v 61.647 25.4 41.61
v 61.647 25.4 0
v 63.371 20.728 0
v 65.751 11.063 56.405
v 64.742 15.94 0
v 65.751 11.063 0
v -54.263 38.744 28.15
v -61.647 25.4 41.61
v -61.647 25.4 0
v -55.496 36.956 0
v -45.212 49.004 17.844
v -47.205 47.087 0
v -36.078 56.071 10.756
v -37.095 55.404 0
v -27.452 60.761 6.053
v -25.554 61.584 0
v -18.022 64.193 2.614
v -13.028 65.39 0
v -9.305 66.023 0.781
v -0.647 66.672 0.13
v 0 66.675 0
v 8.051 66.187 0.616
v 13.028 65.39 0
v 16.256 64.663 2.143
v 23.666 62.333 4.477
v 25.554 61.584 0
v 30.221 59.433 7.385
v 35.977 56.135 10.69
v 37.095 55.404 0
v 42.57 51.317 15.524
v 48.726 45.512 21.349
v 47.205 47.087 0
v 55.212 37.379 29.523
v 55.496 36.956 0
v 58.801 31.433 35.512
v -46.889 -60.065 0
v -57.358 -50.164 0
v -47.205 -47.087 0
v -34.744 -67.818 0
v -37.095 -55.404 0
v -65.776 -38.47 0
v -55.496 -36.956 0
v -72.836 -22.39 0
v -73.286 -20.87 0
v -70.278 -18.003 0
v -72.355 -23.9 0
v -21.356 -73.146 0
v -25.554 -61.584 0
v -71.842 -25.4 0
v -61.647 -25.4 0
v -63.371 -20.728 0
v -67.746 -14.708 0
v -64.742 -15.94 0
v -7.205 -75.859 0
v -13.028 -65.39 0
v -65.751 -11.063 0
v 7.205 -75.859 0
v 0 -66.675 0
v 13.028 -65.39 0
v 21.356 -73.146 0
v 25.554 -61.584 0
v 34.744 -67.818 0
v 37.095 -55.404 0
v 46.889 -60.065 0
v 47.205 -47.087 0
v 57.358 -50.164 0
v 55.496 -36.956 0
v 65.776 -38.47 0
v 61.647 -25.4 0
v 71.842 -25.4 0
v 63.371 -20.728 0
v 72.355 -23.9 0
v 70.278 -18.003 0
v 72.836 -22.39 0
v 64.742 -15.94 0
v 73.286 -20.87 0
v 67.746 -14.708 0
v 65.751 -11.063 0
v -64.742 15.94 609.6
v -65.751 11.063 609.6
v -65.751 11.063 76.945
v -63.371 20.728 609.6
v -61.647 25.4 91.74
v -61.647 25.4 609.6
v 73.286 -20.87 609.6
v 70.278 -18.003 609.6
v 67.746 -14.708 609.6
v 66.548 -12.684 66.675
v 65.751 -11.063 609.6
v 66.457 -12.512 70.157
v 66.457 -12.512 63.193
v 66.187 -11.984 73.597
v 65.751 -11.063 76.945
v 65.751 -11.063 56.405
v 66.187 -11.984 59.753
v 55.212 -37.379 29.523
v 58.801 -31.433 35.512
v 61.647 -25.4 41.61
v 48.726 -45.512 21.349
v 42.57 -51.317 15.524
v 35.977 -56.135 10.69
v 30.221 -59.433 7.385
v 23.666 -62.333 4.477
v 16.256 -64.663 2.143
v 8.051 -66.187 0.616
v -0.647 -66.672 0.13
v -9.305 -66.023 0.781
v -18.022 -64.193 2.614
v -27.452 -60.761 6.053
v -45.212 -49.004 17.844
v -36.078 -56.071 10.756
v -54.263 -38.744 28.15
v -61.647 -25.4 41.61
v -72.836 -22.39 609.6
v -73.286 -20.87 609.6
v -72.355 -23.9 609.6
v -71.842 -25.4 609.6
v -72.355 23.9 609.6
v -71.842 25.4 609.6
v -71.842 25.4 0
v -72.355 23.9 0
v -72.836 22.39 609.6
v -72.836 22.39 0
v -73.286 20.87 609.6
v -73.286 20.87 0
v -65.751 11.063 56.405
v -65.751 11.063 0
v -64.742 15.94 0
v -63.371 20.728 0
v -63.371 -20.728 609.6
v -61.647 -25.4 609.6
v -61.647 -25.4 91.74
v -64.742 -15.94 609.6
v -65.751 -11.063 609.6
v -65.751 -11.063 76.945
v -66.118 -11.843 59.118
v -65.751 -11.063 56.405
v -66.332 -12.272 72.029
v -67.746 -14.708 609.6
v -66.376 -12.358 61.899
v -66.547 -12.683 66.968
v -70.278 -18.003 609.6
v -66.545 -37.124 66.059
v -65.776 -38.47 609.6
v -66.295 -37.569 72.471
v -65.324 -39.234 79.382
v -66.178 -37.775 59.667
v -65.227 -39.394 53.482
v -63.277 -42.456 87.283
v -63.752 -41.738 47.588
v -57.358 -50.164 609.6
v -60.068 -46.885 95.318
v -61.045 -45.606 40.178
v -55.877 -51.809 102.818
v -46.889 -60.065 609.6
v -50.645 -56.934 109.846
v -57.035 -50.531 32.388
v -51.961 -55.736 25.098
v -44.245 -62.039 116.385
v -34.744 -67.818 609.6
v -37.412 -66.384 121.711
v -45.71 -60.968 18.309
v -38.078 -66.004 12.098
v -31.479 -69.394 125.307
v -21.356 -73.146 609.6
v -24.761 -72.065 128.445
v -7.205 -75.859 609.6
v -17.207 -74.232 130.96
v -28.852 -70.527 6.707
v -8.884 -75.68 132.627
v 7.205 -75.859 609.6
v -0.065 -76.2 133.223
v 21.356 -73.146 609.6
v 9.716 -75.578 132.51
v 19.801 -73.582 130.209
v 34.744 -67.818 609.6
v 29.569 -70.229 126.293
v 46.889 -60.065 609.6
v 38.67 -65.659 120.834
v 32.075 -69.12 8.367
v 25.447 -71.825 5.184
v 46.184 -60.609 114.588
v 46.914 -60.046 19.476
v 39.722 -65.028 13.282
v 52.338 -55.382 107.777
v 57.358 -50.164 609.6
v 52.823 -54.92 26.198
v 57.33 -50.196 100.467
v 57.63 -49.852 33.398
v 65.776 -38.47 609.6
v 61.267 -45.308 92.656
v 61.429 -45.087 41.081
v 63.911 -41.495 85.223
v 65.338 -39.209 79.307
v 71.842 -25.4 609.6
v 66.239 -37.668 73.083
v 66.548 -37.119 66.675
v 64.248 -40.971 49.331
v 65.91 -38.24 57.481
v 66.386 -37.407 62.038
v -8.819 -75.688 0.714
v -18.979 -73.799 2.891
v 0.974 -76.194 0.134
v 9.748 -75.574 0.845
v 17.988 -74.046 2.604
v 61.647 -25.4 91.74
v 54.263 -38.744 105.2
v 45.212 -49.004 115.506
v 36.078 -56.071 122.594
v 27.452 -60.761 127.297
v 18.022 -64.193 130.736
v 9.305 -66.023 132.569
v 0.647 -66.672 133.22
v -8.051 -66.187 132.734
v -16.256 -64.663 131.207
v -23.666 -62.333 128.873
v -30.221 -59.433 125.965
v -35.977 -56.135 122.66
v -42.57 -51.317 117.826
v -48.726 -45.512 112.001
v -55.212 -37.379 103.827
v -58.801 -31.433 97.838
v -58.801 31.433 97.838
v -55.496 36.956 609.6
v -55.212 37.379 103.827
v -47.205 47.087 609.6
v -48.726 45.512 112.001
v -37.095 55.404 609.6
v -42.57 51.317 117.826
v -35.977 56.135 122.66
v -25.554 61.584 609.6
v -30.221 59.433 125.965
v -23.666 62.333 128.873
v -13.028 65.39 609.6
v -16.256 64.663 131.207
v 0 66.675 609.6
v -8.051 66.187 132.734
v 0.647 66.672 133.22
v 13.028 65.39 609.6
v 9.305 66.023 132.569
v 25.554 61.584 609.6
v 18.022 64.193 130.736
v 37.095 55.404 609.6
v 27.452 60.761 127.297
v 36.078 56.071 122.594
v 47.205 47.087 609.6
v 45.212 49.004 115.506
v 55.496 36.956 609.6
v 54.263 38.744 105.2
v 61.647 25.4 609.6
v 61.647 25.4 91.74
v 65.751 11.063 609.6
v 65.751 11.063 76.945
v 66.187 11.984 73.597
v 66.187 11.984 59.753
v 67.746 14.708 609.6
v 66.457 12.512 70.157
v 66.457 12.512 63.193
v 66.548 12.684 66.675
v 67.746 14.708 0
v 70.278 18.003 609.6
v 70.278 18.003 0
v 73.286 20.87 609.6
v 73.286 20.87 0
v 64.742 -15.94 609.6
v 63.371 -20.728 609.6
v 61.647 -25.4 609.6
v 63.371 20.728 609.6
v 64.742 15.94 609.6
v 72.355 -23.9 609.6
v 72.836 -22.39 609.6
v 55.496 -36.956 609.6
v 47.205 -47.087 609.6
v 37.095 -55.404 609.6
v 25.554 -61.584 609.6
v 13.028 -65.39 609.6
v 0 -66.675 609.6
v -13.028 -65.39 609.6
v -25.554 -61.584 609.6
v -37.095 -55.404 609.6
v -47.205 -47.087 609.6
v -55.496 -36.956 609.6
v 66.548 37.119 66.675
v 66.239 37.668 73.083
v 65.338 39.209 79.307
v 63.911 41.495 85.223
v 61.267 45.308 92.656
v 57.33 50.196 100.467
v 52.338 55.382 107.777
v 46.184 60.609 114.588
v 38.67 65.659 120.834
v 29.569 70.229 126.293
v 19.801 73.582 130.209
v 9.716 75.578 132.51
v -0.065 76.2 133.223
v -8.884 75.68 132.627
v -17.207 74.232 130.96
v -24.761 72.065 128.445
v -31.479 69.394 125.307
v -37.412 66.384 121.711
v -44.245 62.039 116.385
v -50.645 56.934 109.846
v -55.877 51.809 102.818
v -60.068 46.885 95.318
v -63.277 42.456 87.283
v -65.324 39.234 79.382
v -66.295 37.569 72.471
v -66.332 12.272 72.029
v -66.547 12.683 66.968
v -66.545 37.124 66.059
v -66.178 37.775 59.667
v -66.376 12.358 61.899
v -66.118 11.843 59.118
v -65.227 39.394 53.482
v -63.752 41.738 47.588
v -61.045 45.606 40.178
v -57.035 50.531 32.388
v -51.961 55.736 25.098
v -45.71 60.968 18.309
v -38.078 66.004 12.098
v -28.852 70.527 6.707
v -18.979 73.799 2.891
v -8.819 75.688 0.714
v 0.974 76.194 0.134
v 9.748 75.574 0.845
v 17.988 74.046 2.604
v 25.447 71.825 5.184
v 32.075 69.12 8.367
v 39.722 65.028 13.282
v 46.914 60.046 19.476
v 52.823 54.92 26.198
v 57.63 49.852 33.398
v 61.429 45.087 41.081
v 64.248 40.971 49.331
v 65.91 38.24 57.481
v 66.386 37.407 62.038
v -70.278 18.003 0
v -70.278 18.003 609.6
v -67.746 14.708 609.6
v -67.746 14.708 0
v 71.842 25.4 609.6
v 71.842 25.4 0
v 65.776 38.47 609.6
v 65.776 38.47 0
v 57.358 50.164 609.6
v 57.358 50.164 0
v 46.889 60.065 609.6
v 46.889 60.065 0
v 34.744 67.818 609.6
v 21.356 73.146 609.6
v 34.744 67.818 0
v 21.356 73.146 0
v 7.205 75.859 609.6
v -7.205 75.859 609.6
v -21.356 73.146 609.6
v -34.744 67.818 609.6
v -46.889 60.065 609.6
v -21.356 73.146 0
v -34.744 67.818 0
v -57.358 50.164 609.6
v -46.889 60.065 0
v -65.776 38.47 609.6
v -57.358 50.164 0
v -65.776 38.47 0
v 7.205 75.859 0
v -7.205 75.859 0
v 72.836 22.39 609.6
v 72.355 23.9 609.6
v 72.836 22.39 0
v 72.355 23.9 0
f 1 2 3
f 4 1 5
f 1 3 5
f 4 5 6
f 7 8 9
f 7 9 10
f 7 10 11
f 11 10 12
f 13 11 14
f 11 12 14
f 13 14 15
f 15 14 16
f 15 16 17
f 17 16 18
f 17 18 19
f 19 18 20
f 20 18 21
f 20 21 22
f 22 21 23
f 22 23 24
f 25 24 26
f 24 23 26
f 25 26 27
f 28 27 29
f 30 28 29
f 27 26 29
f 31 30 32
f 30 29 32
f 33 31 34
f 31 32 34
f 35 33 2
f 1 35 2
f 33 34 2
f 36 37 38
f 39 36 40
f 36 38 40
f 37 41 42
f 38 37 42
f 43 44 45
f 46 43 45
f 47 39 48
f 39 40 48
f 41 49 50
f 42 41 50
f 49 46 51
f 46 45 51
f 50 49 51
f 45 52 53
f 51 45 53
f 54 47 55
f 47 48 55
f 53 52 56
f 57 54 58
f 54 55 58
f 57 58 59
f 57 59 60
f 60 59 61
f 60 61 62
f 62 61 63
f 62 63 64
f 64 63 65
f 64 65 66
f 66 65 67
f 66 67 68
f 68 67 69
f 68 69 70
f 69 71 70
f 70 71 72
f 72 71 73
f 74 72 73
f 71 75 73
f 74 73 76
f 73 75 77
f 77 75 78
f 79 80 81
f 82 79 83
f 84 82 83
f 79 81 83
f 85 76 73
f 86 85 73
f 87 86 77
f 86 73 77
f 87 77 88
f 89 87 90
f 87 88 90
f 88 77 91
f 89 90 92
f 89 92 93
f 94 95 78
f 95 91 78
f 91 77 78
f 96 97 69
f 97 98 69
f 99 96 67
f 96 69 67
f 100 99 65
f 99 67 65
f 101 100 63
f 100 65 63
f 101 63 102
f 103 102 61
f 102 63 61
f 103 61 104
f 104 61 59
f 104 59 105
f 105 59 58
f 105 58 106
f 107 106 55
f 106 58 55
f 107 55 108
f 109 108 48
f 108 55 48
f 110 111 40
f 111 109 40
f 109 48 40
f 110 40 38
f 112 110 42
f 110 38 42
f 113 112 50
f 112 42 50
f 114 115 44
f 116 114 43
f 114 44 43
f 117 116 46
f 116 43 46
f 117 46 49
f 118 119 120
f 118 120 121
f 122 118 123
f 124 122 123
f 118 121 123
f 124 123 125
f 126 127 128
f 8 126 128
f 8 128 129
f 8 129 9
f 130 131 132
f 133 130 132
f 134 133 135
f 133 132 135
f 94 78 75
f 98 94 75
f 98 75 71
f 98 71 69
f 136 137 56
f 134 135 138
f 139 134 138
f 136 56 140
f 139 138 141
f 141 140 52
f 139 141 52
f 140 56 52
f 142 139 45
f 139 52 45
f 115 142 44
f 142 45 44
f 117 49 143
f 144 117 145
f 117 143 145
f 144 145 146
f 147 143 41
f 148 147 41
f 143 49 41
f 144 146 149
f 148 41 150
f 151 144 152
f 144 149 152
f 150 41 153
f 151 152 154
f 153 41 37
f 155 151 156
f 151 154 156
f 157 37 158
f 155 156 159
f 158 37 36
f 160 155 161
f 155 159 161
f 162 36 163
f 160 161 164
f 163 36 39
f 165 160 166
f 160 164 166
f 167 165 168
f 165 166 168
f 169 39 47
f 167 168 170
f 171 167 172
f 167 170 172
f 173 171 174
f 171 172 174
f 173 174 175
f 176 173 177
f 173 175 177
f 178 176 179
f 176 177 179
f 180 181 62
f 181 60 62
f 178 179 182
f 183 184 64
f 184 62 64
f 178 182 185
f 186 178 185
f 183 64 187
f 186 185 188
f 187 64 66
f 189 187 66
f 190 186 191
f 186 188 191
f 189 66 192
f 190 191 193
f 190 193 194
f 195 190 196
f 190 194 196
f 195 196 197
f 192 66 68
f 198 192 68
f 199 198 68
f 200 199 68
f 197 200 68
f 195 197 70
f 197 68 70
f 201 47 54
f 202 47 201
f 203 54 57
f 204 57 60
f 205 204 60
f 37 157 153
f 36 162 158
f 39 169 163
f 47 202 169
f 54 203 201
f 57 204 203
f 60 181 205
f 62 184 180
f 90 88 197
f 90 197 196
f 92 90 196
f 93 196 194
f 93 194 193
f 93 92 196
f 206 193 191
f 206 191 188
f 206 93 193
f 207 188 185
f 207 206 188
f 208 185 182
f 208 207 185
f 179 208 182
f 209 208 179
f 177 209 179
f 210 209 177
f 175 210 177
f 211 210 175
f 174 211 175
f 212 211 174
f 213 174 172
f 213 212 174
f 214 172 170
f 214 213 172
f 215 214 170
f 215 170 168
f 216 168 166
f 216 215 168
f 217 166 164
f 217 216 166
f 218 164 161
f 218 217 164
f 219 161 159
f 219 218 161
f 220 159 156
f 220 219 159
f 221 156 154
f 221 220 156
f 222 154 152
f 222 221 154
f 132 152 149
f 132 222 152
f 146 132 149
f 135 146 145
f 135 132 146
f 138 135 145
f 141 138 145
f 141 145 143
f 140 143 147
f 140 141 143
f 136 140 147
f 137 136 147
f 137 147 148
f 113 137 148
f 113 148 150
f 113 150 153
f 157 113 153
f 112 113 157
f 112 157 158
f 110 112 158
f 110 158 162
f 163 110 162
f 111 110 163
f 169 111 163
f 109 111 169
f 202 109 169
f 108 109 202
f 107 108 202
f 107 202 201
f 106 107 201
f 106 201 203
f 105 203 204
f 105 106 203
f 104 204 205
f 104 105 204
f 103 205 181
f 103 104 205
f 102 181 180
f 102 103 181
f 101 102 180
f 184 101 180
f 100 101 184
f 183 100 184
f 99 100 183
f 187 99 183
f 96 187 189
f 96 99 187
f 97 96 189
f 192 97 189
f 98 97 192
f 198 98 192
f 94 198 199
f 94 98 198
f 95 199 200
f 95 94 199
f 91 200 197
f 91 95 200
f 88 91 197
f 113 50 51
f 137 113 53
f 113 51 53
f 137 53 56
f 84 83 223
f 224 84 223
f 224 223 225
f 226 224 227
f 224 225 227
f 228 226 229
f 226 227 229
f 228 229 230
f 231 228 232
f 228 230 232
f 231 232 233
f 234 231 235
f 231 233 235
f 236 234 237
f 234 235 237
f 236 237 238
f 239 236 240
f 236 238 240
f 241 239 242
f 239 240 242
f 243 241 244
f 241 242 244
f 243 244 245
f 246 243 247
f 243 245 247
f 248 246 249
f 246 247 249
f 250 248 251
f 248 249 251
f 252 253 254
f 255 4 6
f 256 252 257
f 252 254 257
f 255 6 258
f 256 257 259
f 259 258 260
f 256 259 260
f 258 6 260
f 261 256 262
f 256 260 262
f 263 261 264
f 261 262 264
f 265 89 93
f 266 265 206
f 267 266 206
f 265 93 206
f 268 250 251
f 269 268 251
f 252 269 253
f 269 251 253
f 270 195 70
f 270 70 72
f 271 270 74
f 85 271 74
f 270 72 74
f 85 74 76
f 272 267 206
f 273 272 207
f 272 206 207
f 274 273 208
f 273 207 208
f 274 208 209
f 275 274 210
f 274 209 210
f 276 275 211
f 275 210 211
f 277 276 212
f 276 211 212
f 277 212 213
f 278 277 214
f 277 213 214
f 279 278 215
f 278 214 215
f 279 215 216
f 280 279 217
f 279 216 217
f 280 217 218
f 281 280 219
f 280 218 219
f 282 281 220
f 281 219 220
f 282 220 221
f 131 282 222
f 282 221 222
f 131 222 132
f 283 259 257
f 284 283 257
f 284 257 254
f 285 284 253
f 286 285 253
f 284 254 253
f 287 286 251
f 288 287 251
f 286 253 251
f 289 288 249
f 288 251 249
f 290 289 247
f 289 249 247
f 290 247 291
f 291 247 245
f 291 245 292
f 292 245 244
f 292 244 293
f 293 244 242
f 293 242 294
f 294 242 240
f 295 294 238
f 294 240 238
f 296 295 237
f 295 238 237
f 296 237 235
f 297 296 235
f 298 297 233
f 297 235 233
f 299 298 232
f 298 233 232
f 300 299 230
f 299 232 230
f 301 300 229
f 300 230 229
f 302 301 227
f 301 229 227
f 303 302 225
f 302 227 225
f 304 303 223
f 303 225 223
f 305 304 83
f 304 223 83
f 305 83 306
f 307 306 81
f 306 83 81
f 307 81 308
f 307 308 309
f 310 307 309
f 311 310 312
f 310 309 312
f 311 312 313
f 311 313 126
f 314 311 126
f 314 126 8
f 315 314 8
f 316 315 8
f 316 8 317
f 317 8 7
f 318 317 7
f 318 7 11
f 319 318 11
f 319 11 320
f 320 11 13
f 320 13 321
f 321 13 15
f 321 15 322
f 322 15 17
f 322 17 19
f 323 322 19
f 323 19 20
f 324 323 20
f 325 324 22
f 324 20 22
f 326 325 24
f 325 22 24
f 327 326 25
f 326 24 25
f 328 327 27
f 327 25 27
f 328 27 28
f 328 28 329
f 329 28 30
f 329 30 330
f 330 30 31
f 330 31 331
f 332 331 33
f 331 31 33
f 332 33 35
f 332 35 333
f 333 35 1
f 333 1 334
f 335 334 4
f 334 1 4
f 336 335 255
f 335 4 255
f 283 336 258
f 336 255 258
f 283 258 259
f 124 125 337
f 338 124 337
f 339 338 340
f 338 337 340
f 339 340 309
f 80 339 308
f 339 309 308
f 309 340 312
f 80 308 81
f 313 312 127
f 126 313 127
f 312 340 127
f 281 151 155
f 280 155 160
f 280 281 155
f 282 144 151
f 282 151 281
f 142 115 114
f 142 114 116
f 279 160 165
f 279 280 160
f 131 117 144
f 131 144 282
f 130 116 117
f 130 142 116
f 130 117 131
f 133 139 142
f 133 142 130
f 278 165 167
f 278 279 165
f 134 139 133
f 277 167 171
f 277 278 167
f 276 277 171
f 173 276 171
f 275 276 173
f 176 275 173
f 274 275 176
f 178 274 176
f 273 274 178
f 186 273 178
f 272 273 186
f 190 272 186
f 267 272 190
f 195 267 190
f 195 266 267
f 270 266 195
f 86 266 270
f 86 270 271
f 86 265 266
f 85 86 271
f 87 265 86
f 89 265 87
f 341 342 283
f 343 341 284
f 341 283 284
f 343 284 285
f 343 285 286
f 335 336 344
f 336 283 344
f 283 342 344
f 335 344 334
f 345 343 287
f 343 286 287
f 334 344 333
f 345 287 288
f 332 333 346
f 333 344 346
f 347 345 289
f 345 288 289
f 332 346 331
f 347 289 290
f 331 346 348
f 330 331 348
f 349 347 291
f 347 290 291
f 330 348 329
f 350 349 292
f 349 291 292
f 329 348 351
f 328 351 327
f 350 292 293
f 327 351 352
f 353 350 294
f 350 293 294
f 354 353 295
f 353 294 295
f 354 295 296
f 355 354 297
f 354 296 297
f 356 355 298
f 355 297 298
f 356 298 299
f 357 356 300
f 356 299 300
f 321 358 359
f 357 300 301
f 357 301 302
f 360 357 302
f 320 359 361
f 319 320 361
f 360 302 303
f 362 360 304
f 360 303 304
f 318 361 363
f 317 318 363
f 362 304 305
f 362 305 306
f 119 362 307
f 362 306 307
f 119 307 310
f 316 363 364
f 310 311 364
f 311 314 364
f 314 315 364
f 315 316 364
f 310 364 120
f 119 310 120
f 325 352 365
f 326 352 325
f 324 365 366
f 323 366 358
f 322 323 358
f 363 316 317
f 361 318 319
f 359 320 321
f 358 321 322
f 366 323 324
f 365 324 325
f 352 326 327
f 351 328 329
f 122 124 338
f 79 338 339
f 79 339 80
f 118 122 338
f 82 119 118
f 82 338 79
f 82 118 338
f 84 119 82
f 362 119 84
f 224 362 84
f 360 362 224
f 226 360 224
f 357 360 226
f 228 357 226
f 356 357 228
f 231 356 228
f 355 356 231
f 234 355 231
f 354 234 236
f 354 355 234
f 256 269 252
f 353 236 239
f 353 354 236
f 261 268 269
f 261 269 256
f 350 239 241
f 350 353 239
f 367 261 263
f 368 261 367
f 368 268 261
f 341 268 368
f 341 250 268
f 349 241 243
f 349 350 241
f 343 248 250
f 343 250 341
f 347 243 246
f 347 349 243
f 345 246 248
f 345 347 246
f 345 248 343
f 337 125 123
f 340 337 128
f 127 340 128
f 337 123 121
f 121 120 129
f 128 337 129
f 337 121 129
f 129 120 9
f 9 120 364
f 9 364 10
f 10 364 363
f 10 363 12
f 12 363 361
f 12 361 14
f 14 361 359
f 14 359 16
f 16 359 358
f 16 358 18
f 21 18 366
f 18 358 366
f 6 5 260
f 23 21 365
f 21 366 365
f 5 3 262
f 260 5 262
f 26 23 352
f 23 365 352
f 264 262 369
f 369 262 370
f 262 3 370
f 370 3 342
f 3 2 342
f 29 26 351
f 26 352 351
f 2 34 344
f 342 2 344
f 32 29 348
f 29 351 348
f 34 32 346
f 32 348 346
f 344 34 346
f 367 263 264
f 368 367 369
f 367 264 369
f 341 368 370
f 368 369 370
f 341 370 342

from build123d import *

# Parameters (mm, degrees)
F1_DEPTH = 609.6
F3_R     = 66.548
F4_DEPTH = 154.94
F5_DEPTH = 124.46


with BuildPart() as f1:
    # F0 (on Top) → F1 (new body)
    with BuildSketch(Plane.XY):
        with BuildLine():
            ThreePointArc((61.647349, -25.4), (0, -66.675), (-61.647349, -25.4))
            ThreePointArc((-61.647349, -25.4), (-64.101181, -18.346503), (-65.750812, -11.062835))
            ThreePointArc((-65.750812, -11.062835), (-68.947885, -16.404785), (-73.286413, -20.869634))
            ThreePointArc((-73.286413, -20.869634), (-72.599578, -23.146086), (-71.842049, -25.4))
            ThreePointArc((-71.842049, -25.4), (0, -76.2), (71.842049, -25.4))
            ThreePointArc((71.842049, -25.4), (72.599578, -23.146086), (73.286413, -20.869634))
            ThreePointArc((73.286413, -20.869634), (68.947885, -16.404785), (65.750812, -11.062835))
            ThreePointArc((65.750812, -11.062835), (64.101181, -18.346503), (61.647349, -25.4))
        make_face()
        with BuildLine():
            ThreePointArc((-61.647349, 25.4), (0, 66.675), (61.647349, 25.4))
            ThreePointArc((61.647349, 25.4), (64.101181, 18.346503), (65.750812, 11.062835))
            ThreePointArc((65.750812, 11.062835), (68.947885, 16.404785), (73.286413, 20.869634))
            ThreePointArc((73.286413, 20.869634), (72.599578, 23.146086), (71.842049, 25.4))
            ThreePointArc((71.842049, 25.4), (0, 76.2), (-71.842049, 25.4))
            ThreePointArc((-71.842049, 25.4), (-72.599578, 23.146086), (-73.286413, 20.869634))
            ThreePointArc((-73.286413, 20.869634), (-68.947885, 16.404785), (-65.750812, 11.062835))
            ThreePointArc((-65.750812, 11.062835), (-64.101181, 18.346503), (-61.647349, 25.4))
        make_face()
    extrude(amount=F1_DEPTH)

    # F3 (on Front) → F4 (cut)
    with BuildSketch(Plane.XZ):
        with Locations((0, 66.675)):
            Circle(F3_R)
    extrude(amount=-F4_DEPTH, mode=Mode.SUBTRACT)

    # F3 (on Front) → F5 (cut)
    with BuildSketch(Plane.XZ):
        with Locations((0, 66.675)):
            Circle(F3_R)
    extrude(amount=F5_DEPTH, mode=Mode.SUBTRACT)


solid = f1.part
